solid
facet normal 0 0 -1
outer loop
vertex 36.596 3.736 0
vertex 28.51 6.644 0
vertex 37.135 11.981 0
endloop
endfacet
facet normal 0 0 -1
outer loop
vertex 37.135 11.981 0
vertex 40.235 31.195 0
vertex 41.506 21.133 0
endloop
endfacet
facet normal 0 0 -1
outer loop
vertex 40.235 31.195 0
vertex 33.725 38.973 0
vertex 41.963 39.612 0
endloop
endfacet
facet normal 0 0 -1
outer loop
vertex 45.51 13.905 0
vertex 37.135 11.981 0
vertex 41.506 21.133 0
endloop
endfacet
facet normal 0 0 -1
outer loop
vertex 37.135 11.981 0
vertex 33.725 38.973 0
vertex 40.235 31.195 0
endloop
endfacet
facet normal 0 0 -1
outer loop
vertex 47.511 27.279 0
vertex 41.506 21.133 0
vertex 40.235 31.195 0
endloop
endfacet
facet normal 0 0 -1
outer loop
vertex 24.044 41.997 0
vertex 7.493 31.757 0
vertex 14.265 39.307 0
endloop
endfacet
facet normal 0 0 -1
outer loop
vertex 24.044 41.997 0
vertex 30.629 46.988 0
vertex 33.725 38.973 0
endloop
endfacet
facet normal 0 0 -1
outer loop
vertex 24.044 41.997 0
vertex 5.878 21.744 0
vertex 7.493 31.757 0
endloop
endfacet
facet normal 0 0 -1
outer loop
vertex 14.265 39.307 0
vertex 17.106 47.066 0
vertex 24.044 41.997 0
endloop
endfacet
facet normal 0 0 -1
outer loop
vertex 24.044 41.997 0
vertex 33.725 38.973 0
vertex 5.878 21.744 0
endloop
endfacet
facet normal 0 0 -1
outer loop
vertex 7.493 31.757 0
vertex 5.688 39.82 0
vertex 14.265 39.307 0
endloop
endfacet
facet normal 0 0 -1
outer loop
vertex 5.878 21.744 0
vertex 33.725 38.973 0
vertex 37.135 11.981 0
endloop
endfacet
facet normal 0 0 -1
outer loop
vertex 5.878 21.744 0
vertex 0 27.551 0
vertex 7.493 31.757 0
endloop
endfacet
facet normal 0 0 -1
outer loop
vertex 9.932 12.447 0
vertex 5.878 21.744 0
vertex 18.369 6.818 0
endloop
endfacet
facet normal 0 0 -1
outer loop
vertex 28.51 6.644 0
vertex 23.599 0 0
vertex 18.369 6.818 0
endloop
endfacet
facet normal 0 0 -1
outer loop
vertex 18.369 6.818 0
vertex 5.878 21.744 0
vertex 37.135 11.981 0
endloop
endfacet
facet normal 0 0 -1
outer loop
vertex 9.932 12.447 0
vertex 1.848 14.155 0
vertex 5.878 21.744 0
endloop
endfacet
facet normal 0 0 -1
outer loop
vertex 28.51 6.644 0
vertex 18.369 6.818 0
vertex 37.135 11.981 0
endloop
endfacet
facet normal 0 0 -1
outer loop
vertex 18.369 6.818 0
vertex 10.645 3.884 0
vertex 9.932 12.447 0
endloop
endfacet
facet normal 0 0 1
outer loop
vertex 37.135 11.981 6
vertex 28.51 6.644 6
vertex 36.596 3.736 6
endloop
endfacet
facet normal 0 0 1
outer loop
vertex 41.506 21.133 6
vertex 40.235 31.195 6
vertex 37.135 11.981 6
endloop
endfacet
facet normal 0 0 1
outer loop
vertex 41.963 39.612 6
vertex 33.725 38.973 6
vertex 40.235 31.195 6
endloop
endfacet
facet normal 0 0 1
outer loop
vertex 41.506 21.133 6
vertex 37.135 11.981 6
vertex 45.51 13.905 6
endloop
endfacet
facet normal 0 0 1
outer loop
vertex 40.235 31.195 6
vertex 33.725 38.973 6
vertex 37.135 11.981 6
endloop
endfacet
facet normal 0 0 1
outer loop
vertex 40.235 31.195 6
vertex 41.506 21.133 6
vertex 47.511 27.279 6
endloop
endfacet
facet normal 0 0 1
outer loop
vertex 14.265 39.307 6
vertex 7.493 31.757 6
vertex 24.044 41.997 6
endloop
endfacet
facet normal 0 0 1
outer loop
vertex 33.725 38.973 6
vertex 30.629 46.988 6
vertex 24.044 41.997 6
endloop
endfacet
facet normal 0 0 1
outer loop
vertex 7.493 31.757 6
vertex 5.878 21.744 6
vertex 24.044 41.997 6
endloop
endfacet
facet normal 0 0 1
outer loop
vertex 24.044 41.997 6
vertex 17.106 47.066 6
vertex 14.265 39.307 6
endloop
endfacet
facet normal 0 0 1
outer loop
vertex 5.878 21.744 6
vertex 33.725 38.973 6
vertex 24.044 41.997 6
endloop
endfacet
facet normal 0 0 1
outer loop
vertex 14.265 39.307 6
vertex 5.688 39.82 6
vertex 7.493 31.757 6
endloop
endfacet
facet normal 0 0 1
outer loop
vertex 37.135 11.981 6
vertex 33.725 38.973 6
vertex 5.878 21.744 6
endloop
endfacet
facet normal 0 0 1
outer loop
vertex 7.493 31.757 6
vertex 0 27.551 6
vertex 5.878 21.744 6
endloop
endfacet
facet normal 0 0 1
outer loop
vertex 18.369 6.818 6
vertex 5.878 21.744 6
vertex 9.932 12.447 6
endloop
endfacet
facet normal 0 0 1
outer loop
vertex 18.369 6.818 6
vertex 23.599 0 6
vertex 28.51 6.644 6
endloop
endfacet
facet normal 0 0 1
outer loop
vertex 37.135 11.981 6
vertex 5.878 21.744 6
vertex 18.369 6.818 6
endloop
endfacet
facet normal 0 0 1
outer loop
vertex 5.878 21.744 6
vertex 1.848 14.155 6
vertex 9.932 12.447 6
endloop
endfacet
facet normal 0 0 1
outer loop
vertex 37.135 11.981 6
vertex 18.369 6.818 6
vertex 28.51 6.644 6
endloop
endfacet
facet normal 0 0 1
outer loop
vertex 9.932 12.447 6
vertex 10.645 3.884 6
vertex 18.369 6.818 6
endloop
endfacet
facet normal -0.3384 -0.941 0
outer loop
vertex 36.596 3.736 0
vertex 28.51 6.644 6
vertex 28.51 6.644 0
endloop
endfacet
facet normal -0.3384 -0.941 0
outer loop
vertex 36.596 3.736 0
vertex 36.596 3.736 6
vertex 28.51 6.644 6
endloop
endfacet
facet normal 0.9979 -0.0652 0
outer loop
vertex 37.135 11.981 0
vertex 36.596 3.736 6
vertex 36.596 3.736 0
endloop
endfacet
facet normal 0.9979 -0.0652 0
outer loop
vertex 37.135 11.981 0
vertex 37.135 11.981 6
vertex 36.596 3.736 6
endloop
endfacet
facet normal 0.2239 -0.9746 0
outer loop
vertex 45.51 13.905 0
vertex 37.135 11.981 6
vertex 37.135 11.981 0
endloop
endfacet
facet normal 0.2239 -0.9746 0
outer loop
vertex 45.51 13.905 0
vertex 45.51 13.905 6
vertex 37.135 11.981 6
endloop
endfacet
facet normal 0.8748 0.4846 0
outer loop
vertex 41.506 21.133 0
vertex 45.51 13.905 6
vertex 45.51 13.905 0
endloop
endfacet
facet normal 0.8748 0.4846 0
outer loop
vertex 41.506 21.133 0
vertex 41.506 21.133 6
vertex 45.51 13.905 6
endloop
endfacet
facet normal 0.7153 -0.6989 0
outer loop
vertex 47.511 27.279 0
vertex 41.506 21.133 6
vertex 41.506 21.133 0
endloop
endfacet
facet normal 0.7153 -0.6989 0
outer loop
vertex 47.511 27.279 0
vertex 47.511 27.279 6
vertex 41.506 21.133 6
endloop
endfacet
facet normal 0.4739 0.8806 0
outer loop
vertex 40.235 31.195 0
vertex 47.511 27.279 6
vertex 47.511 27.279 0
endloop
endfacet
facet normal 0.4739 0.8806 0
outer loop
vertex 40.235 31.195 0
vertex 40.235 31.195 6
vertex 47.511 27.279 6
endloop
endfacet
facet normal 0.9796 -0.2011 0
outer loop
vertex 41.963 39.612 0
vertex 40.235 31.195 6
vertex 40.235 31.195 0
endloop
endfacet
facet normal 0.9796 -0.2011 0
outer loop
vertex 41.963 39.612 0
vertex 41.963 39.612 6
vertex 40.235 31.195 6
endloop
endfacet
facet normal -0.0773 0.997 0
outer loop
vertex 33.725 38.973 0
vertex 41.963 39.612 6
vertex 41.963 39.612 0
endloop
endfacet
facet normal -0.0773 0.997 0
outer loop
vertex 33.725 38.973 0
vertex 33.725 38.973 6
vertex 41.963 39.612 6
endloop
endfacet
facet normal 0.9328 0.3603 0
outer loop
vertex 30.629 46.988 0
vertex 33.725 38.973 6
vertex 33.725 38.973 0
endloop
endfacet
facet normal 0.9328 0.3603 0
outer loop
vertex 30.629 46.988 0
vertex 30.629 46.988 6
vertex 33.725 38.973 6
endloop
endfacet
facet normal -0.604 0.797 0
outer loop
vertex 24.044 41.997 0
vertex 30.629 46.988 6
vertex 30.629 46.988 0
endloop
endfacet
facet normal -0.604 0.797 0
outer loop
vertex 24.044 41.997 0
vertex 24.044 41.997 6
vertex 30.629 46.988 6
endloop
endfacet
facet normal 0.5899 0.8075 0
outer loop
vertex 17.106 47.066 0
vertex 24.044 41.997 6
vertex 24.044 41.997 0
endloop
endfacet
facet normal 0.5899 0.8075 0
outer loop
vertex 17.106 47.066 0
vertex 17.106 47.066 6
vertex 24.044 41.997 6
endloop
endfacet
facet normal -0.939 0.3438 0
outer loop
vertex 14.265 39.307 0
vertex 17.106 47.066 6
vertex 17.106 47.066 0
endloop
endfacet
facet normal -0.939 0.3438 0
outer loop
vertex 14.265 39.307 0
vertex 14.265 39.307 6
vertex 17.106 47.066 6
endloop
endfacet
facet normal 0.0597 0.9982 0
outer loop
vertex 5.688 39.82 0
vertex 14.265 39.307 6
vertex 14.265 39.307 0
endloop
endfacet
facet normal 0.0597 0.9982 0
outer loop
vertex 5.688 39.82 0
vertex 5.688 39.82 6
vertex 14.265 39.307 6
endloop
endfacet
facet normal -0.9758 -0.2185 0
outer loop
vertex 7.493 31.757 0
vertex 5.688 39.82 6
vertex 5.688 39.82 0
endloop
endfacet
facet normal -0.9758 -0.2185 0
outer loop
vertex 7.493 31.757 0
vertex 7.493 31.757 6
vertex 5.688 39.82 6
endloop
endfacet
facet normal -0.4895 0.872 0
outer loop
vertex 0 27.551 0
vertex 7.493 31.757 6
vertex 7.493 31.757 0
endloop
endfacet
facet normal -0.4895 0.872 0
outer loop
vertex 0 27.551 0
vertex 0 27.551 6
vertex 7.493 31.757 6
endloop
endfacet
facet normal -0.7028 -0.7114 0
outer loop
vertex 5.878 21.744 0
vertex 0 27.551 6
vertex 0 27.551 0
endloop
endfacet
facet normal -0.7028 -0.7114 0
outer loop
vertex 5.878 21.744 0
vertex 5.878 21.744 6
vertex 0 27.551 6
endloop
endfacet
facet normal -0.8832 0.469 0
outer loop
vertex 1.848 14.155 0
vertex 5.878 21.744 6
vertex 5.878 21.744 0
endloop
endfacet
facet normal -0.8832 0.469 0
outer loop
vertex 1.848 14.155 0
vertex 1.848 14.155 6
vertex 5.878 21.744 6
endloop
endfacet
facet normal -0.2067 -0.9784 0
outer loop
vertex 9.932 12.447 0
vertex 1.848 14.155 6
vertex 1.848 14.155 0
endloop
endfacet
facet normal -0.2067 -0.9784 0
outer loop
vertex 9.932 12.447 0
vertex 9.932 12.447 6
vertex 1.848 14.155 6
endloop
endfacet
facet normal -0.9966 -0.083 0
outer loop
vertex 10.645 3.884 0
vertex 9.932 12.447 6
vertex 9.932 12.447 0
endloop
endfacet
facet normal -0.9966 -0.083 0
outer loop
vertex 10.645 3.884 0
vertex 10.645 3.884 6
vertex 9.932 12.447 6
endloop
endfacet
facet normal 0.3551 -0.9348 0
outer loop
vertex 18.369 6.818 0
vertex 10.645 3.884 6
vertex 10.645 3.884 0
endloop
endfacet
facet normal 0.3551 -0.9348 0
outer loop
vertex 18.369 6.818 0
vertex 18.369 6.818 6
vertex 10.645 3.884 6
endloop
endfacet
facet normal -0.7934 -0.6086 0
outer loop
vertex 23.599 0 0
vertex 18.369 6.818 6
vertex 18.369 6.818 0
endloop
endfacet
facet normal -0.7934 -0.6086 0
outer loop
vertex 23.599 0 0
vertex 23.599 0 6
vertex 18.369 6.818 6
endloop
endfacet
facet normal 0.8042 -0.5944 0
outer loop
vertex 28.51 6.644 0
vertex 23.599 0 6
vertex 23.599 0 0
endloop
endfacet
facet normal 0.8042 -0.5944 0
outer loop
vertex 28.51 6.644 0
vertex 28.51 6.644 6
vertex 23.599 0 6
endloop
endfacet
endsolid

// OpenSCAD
$fn = 32;

// ----------------------------------------------------------------------
// Chain sprocket: 11 teeth, 18 mm root radius
// ----------------------------------------------------------------------

// --- parameters (mm) ---
profile_height = 6;       // extrusion height
profile_points = 22;      // points of the closed outline

profile = [[41.506, 21.133], [47.511, 27.279], [40.235, 31.195], [41.963, 39.612], [33.725, 38.973], [30.629, 46.988], [24.044, 41.997], [17.106, 47.066], [14.265, 39.307], [5.688, 39.82], [7.493, 31.757], [0, 27.551], [5.878, 21.744], [1.848, 14.155], [9.932, 12.447], [10.645, 3.884], [18.369, 6.818], [23.599, 0], [28.51, 6.644], [36.596, 3.736], [37.135, 11.981], [45.51, 13.905]];  // single closed polygon, 22 points, counter clockwise

// --- the one profile operation ---
linear_extrude(height = profile_height) polygon(points = profile);
